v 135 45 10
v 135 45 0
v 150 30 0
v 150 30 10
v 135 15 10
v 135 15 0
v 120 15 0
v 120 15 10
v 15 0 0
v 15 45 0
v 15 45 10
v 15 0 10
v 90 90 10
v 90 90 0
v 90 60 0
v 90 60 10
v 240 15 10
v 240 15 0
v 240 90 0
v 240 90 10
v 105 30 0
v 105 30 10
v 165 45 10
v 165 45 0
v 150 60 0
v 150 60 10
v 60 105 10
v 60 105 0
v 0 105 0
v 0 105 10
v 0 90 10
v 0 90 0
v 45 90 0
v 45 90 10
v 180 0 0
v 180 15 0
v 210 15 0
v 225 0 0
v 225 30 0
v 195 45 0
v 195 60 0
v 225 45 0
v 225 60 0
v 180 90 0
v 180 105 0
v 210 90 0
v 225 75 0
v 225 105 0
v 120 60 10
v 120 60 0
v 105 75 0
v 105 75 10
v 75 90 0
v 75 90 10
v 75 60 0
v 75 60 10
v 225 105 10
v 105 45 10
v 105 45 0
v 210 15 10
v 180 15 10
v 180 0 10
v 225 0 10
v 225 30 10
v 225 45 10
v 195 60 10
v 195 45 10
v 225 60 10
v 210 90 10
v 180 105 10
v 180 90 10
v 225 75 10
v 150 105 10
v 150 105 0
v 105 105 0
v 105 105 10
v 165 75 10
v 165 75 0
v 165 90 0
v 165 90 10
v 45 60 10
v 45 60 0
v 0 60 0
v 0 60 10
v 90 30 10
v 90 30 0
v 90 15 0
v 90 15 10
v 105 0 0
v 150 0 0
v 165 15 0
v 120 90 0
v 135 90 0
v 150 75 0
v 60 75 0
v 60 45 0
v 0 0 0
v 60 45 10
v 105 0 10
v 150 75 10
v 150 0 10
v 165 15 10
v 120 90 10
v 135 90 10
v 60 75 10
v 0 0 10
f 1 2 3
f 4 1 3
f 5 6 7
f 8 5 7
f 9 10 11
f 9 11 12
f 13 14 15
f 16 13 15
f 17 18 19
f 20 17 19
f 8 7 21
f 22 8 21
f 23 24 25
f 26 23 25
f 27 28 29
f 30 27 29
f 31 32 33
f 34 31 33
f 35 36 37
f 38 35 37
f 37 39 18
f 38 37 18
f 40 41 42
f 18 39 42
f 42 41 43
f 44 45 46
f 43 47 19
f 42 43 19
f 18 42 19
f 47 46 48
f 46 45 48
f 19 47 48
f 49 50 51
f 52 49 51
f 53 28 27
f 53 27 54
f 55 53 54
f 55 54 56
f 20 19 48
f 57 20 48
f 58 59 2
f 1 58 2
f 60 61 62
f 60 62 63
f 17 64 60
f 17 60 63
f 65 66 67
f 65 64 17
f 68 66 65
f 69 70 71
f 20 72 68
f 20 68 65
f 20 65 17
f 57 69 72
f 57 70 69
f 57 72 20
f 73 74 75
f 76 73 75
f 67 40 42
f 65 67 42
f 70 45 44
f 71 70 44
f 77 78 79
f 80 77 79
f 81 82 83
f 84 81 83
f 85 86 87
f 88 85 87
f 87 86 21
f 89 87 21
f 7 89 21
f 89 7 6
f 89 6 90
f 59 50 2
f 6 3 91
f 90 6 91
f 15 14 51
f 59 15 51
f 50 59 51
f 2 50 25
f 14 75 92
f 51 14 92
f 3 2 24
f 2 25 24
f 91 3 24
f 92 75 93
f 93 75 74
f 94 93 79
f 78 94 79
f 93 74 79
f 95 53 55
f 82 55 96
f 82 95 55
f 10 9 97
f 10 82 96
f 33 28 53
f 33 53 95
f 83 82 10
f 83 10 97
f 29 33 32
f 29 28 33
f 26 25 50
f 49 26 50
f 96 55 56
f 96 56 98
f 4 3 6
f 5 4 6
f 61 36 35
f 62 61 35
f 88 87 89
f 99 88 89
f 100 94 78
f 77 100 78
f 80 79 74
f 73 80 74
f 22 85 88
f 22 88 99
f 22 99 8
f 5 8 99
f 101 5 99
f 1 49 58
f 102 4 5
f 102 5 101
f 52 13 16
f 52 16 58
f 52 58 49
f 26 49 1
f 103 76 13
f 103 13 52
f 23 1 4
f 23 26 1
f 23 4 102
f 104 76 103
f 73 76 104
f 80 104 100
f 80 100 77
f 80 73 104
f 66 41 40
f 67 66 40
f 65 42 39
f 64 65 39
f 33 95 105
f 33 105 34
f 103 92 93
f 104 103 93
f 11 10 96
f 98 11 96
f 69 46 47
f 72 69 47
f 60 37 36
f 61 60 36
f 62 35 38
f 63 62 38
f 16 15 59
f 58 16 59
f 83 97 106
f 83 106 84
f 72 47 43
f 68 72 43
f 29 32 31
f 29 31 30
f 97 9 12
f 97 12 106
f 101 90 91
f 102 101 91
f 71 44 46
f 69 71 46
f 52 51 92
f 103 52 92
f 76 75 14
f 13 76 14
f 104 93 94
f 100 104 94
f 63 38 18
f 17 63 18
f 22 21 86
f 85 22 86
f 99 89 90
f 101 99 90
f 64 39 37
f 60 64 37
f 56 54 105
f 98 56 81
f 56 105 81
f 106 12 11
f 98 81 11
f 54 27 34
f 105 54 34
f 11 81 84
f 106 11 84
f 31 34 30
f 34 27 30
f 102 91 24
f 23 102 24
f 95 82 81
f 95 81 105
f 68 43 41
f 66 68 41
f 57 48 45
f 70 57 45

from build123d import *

# Parameters (mm, degrees)
EXTRUDE1_DEPTH   = 10
EXTRUDE1_2_DEPTH = 10
EXTRUDE1_3_DEPTH = 10


with BuildPart() as part:
    # Sketch2 → Extrude1 (new body)
    with BuildSketch(Plane.XY):
        Polygon((0, 90), (0, 105), (45, 105), (60, 105), (75, 90), (75, 60), (60, 45), (45, 45), (15, 45), (15, 0), (0, 0), (0, 60), (30, 60), (45, 60), (60, 75), (45, 90), (30, 90), align=None)
    extrude(amount=EXTRUDE1_DEPTH)


with BuildPart() as body_2:
    # Sketch2 → Extrude1 2 (new body)
    with BuildSketch(Plane.XY):
        Polygon((105, 30), (90, 30), (90, 15), (105, 0), (150, 0), (165, 15), (165, 45), (150, 60), (135, 60), (120, 60), (105, 75), (120, 90), (135, 90), (150, 75), (165, 75), (165, 90), (150, 105), (105, 105), (90, 90), (90, 60), (105, 45), (135, 45), (150, 30), (135, 15), (120, 15), align=None)
    extrude(amount=EXTRUDE1_2_DEPTH)


with BuildPart() as body_3:
    # Sketch2 → Extrude1 3 (new body)
    with BuildSketch(Plane.XY):
        Polygon((180, 15), (180, 0), (225, 0), (240, 15), (240, 90), (225, 105), (180, 105), (180, 90), (210, 90), (225, 75), (225, 60), (195, 60), (195, 45), (225, 45), (225, 30), (210, 15), align=None)
    extrude(amount=EXTRUDE1_3_DEPTH)


solid = Compound([part.part, body_2.part, body_3.part])
